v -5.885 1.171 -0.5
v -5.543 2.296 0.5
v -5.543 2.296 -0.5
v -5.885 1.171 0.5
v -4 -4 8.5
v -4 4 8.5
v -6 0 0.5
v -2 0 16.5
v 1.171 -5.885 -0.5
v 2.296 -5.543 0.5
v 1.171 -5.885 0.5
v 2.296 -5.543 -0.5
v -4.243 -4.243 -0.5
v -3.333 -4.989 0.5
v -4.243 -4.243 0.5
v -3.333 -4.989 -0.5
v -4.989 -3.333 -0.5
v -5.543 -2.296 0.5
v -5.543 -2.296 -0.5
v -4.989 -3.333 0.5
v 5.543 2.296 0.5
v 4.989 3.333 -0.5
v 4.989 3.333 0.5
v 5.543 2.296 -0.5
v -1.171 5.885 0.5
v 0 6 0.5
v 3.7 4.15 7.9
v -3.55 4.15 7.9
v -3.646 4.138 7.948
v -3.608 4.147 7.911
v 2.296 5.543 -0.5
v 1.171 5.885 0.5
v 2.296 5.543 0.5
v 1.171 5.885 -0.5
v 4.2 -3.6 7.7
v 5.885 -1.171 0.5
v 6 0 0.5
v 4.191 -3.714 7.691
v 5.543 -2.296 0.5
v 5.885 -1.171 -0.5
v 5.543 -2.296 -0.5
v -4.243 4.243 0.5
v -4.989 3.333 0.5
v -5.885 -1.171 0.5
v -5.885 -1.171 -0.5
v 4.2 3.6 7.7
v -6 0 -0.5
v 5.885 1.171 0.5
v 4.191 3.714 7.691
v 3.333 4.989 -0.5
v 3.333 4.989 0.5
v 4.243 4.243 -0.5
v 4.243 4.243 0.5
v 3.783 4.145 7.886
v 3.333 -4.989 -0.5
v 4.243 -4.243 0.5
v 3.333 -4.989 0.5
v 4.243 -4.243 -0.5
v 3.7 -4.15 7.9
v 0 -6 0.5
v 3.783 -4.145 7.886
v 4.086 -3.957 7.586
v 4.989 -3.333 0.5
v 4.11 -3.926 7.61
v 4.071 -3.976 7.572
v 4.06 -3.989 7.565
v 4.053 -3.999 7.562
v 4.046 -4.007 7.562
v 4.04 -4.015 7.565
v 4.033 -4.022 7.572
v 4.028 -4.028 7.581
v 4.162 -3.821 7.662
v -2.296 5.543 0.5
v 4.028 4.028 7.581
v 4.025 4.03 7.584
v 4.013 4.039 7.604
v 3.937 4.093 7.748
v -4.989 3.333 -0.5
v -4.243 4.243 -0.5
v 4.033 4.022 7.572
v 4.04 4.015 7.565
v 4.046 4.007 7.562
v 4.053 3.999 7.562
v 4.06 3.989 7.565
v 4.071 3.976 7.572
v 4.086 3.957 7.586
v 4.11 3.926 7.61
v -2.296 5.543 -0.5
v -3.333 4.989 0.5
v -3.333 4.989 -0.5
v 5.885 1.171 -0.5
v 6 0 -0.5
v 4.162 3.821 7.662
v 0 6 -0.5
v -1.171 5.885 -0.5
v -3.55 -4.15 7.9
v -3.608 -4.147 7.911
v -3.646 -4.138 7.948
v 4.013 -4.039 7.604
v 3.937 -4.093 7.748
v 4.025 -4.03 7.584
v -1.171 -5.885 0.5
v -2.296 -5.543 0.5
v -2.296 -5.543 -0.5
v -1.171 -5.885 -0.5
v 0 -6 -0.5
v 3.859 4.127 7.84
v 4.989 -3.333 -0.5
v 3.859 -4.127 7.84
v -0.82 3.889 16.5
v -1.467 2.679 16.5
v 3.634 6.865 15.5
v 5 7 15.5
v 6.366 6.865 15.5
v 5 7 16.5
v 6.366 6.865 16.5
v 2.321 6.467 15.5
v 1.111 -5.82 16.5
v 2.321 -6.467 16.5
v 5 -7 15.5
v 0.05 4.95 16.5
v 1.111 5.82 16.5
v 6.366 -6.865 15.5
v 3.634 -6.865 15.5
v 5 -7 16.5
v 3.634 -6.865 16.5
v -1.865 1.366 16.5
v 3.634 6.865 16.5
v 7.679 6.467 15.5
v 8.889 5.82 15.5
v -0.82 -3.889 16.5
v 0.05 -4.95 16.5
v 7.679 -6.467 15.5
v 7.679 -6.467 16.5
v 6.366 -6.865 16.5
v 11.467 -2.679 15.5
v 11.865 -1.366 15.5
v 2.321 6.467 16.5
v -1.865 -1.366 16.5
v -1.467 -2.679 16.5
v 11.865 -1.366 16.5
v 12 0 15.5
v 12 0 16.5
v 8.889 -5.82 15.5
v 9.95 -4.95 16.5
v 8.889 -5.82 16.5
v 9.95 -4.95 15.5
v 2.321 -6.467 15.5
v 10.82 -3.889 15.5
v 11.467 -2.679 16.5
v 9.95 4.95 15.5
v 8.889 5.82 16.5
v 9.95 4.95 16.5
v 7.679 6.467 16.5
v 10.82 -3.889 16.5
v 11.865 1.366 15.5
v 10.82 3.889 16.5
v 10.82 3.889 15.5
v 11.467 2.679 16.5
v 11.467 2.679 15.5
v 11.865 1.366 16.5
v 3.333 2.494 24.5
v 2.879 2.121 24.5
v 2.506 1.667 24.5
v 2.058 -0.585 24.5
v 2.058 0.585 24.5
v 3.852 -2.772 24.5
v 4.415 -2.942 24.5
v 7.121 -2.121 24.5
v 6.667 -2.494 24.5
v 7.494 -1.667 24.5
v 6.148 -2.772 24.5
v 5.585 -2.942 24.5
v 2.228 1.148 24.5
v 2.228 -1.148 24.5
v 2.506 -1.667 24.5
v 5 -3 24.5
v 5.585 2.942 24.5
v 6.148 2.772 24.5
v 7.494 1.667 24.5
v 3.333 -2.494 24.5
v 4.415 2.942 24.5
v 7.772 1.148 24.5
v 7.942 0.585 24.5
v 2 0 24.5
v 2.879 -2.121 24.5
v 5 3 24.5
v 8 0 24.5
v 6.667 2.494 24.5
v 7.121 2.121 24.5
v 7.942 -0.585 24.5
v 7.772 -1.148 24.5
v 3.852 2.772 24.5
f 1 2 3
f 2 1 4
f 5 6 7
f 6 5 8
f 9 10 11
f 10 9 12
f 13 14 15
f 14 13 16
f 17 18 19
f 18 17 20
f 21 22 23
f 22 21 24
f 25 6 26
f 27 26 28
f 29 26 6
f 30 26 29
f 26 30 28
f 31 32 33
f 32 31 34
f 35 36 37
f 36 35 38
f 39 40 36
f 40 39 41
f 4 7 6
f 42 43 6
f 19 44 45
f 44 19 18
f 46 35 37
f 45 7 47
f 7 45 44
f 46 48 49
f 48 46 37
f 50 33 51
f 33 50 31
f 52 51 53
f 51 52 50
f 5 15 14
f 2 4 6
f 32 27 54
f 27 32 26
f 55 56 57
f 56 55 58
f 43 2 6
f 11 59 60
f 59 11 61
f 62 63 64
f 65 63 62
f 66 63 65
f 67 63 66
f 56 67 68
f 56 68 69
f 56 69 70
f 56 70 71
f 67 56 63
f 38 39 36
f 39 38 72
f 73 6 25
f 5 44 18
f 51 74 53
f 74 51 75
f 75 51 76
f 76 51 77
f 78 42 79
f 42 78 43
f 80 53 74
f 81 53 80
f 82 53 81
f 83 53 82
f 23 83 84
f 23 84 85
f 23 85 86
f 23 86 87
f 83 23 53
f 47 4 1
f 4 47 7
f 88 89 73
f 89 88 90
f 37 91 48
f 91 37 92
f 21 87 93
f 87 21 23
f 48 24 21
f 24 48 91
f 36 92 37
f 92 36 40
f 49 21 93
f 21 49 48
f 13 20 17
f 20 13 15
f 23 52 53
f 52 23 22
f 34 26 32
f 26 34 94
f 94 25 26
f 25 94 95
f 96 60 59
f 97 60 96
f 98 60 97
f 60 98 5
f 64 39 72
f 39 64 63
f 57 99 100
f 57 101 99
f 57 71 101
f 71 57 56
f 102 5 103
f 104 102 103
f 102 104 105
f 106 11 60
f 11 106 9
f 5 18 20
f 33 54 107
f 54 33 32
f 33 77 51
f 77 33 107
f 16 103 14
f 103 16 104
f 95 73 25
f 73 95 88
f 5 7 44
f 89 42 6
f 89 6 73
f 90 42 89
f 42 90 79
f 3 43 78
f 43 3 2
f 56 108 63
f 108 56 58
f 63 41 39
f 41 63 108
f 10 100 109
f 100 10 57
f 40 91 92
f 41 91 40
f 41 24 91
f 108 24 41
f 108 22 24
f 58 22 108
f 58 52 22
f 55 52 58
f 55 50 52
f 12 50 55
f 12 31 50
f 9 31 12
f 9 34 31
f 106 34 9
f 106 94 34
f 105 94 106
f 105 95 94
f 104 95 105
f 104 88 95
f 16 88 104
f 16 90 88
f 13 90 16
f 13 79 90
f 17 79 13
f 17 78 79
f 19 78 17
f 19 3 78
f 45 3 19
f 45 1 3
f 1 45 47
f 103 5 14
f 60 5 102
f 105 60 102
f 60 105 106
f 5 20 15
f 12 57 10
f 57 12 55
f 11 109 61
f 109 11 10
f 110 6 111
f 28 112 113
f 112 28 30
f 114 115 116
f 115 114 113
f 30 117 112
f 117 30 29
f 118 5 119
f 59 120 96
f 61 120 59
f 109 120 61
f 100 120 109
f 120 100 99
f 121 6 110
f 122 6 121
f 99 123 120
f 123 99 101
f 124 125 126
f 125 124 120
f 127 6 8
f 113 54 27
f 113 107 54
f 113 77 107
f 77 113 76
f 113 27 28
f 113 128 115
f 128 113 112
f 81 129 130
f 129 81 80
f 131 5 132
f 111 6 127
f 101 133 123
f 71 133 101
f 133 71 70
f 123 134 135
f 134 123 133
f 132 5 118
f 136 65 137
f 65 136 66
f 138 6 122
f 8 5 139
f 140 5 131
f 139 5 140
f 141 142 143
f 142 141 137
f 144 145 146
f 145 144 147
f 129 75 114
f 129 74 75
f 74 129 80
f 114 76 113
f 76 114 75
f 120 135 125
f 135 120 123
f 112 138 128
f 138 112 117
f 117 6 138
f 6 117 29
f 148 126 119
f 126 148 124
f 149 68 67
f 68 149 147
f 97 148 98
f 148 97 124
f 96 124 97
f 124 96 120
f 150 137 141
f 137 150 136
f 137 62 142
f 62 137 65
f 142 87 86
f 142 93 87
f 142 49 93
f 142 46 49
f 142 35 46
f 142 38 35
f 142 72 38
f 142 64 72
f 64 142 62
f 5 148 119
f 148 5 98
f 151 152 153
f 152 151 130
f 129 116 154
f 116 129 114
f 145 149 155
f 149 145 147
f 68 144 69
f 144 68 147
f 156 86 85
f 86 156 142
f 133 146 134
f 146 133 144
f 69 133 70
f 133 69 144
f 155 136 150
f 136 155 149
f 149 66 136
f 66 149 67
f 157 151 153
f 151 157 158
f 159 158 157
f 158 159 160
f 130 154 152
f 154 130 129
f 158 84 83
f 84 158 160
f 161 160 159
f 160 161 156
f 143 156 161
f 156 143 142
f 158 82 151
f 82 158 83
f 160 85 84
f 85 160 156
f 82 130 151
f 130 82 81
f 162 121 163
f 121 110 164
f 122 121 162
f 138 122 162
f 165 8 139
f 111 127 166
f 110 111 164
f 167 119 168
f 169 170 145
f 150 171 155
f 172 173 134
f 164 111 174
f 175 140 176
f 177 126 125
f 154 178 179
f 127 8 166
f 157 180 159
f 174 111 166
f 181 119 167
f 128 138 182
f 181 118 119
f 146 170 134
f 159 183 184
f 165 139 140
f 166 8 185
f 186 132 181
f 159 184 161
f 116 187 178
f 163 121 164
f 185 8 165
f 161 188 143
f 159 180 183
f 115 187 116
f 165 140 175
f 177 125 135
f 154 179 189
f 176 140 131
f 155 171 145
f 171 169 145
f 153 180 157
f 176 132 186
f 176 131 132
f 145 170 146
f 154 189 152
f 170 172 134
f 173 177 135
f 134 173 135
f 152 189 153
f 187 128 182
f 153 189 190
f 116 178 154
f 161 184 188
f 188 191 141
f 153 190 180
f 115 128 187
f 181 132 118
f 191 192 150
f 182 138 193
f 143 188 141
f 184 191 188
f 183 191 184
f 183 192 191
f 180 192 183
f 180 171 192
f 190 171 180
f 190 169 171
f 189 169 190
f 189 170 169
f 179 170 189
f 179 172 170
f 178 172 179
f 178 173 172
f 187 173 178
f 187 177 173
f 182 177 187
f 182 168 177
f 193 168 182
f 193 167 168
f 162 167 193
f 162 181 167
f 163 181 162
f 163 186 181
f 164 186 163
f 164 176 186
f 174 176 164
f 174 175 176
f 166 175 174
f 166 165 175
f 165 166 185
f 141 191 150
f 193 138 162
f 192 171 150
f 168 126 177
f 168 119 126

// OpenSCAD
// =============================================================================
// test_sequential_hull.scad
//
// Sequential hull: hulls consecutive pairs of children.
// Pattern from: m12.scad, compact_nut_seat.scad (used extensively in OpenFlexure)
// Expected: a smooth sweep through multiple cross-sections, like a variable
//           extrusion or loft.
// =============================================================================

$fn = 32;

module sequential_hull() {
    for (i = [0 : $children - 2]) {
        hull() {
            children(i);
            children(i + 1);
        }
    }
}

// Sweep: circle → square → circle → small circle
sequential_hull() {
    translate([0, 0, 0])  cylinder(r = 6, h = 1, center = true);
    translate([0, 0, 8])  cube([8, 8, 1], center = true);
    translate([5, 0, 16]) cylinder(r = 7, h = 1, center = true);
    translate([5, 0, 24]) cylinder(r = 3, h = 1, center = true);
}
